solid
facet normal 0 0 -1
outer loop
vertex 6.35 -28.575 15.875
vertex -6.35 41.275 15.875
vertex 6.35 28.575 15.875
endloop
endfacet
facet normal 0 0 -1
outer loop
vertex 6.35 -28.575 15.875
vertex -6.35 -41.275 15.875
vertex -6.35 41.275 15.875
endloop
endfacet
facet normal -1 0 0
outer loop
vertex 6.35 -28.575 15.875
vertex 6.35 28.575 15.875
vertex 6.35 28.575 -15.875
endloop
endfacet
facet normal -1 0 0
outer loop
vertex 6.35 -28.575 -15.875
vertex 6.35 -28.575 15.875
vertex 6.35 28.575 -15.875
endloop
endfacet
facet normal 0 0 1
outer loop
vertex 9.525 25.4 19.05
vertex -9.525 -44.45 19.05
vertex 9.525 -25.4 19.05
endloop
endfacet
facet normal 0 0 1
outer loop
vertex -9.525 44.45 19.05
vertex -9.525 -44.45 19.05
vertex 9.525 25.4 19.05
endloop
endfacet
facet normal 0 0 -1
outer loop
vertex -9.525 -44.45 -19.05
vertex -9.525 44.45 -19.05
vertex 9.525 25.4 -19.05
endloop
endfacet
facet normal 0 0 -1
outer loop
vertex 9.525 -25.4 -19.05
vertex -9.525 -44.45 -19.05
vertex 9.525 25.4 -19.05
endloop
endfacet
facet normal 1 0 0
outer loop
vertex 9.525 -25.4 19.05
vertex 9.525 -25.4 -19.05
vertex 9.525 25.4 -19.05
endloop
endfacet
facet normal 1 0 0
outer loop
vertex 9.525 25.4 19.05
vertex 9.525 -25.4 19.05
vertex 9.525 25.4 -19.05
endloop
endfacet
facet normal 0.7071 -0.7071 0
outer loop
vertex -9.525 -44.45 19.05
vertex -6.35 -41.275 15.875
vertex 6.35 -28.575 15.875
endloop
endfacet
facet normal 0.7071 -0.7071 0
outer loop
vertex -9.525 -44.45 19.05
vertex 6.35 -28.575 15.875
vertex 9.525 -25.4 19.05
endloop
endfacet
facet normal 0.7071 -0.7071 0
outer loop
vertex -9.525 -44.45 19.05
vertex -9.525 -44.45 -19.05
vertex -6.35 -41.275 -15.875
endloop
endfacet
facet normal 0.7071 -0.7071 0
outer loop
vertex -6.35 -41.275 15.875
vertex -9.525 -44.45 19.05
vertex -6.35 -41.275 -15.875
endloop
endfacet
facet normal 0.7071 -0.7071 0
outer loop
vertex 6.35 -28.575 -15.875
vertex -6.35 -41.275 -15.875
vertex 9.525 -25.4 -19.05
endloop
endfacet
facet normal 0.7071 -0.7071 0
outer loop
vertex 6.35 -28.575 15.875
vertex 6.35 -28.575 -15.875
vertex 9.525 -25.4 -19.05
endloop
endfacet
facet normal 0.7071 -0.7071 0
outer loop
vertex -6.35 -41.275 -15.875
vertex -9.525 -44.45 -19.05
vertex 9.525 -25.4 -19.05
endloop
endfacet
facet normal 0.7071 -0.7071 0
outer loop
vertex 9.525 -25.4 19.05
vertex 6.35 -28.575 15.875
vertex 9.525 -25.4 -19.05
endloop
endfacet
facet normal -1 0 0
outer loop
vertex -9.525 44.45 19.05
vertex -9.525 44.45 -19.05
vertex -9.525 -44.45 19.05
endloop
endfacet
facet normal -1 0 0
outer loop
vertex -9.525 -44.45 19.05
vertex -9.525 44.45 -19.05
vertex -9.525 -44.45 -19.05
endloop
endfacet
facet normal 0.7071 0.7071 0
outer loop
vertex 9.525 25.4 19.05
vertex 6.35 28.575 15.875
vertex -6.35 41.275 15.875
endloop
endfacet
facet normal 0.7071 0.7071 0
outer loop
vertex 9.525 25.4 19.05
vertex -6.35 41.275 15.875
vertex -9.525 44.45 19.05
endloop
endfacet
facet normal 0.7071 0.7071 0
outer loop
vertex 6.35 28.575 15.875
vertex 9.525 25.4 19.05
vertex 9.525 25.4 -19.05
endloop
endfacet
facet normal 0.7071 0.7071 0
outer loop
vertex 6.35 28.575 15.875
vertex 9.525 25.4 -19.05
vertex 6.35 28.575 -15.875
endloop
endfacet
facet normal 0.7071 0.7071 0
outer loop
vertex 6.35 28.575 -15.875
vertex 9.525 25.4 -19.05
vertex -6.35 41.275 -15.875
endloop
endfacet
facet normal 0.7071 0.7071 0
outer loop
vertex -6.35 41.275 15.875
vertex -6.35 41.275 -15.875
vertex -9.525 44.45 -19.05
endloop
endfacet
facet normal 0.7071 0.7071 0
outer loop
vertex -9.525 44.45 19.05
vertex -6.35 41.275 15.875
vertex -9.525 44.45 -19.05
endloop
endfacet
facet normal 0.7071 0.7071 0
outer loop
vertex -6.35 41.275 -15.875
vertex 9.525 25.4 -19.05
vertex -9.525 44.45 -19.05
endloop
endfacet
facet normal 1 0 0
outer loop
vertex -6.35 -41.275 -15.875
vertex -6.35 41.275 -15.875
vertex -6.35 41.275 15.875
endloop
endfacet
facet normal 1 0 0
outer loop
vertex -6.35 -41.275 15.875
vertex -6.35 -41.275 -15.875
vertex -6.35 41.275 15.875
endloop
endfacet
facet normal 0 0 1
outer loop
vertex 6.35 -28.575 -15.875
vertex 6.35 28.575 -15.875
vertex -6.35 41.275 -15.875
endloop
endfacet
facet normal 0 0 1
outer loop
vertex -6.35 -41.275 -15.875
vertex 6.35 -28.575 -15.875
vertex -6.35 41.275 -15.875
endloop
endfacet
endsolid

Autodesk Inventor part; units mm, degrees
ref_plane "YZ Plane" through (0, 0, 0) normal (1, 0, 0) x (0, 1, 0)
ref_plane "XZ Plane" through (0, 0, 0) normal (0, 1, 0) x (-1, 0, 0)
ref_plane "XY Plane" through (0, 0, 0) normal (0, 0, 1) x (1, 0, 0)
sketch "Sketch1" plane through (0, 0, 0) normal (0, 0, 1) x (1, 0, 0)
  line L0 (-9.525, -25.4) -> (9.525, -25.4)
  line L1 (9.525, -25.4) -> (9.525, 25.4)
  line L2 (9.525, 25.4) -> (-9.525, 25.4)
  line L3 (-9.525, 25.4) -> (-9.525, -25.4)
  line L4 (-9.525, -25.4) -> (9.525, 25.4) construction
  line L5 (9.525, -25.4) -> (-9.525, 25.4) construction
  line L6 (9.525, 25.4) -> (-9.525, 44.45)
  line L7 (-9.525, 44.45) -> (-9.525, 25.4)
  line L8 (-9.525, -25.4) -> (-9.525, -44.45)
  line L9 (-9.525, -44.45) -> (9.525, -25.4)
  point P0 (0, 0)
  dimension "d0" = 19.05
  dimension "d1" = 45
  dimension "d2" = 45
  dimension "d10" = 88.9
extrude "Extrusion1" add sketch "Sketch1" along normal mid plane 38.1
sketch "Sketch2" plane through (0, 0, 0) normal (0, 1, 0) x (-1, 0, 0)
  line L0 (6.35, 15.875) -> (-6.35, 15.875)
  line L1 (-6.35, 15.875) -> (-6.35, -15.875)
  line L2 (-6.35, -15.875) -> (6.35, -15.875)
  line L3 (6.35, -15.875) -> (6.35, 15.875)
  line L4 (6.35, 15.875) -> (-6.35, -15.875) construction
  line L5 (-6.35, 15.875) -> (6.35, -15.875) construction
  line L6 (-9.525, -19.05) -> (-9.525, 19.05) projected
  line L7 (-9.525, -19.05) -> (9.525, -19.05) projected
  point P0 (0, 0)
  dimension "d6" = 3.175
  dimension "d7" = 3.175
extrude "Extrusion2" cut sketch "Sketch2" along normal through all both and the other way through all
equation "\"d0\" = width"
equation "\"d10\" = length"
equation "\"d3\" = longSide"
equation "\"d8\" = longSide"
equation "\"width\" = 19.05"
equation "\"longSide\" = 38.1"
equation "\"length\" = 88.9"
properties part number "45dege0_75x1.50ForTopOfShooter" material "Aluminum 6061"
